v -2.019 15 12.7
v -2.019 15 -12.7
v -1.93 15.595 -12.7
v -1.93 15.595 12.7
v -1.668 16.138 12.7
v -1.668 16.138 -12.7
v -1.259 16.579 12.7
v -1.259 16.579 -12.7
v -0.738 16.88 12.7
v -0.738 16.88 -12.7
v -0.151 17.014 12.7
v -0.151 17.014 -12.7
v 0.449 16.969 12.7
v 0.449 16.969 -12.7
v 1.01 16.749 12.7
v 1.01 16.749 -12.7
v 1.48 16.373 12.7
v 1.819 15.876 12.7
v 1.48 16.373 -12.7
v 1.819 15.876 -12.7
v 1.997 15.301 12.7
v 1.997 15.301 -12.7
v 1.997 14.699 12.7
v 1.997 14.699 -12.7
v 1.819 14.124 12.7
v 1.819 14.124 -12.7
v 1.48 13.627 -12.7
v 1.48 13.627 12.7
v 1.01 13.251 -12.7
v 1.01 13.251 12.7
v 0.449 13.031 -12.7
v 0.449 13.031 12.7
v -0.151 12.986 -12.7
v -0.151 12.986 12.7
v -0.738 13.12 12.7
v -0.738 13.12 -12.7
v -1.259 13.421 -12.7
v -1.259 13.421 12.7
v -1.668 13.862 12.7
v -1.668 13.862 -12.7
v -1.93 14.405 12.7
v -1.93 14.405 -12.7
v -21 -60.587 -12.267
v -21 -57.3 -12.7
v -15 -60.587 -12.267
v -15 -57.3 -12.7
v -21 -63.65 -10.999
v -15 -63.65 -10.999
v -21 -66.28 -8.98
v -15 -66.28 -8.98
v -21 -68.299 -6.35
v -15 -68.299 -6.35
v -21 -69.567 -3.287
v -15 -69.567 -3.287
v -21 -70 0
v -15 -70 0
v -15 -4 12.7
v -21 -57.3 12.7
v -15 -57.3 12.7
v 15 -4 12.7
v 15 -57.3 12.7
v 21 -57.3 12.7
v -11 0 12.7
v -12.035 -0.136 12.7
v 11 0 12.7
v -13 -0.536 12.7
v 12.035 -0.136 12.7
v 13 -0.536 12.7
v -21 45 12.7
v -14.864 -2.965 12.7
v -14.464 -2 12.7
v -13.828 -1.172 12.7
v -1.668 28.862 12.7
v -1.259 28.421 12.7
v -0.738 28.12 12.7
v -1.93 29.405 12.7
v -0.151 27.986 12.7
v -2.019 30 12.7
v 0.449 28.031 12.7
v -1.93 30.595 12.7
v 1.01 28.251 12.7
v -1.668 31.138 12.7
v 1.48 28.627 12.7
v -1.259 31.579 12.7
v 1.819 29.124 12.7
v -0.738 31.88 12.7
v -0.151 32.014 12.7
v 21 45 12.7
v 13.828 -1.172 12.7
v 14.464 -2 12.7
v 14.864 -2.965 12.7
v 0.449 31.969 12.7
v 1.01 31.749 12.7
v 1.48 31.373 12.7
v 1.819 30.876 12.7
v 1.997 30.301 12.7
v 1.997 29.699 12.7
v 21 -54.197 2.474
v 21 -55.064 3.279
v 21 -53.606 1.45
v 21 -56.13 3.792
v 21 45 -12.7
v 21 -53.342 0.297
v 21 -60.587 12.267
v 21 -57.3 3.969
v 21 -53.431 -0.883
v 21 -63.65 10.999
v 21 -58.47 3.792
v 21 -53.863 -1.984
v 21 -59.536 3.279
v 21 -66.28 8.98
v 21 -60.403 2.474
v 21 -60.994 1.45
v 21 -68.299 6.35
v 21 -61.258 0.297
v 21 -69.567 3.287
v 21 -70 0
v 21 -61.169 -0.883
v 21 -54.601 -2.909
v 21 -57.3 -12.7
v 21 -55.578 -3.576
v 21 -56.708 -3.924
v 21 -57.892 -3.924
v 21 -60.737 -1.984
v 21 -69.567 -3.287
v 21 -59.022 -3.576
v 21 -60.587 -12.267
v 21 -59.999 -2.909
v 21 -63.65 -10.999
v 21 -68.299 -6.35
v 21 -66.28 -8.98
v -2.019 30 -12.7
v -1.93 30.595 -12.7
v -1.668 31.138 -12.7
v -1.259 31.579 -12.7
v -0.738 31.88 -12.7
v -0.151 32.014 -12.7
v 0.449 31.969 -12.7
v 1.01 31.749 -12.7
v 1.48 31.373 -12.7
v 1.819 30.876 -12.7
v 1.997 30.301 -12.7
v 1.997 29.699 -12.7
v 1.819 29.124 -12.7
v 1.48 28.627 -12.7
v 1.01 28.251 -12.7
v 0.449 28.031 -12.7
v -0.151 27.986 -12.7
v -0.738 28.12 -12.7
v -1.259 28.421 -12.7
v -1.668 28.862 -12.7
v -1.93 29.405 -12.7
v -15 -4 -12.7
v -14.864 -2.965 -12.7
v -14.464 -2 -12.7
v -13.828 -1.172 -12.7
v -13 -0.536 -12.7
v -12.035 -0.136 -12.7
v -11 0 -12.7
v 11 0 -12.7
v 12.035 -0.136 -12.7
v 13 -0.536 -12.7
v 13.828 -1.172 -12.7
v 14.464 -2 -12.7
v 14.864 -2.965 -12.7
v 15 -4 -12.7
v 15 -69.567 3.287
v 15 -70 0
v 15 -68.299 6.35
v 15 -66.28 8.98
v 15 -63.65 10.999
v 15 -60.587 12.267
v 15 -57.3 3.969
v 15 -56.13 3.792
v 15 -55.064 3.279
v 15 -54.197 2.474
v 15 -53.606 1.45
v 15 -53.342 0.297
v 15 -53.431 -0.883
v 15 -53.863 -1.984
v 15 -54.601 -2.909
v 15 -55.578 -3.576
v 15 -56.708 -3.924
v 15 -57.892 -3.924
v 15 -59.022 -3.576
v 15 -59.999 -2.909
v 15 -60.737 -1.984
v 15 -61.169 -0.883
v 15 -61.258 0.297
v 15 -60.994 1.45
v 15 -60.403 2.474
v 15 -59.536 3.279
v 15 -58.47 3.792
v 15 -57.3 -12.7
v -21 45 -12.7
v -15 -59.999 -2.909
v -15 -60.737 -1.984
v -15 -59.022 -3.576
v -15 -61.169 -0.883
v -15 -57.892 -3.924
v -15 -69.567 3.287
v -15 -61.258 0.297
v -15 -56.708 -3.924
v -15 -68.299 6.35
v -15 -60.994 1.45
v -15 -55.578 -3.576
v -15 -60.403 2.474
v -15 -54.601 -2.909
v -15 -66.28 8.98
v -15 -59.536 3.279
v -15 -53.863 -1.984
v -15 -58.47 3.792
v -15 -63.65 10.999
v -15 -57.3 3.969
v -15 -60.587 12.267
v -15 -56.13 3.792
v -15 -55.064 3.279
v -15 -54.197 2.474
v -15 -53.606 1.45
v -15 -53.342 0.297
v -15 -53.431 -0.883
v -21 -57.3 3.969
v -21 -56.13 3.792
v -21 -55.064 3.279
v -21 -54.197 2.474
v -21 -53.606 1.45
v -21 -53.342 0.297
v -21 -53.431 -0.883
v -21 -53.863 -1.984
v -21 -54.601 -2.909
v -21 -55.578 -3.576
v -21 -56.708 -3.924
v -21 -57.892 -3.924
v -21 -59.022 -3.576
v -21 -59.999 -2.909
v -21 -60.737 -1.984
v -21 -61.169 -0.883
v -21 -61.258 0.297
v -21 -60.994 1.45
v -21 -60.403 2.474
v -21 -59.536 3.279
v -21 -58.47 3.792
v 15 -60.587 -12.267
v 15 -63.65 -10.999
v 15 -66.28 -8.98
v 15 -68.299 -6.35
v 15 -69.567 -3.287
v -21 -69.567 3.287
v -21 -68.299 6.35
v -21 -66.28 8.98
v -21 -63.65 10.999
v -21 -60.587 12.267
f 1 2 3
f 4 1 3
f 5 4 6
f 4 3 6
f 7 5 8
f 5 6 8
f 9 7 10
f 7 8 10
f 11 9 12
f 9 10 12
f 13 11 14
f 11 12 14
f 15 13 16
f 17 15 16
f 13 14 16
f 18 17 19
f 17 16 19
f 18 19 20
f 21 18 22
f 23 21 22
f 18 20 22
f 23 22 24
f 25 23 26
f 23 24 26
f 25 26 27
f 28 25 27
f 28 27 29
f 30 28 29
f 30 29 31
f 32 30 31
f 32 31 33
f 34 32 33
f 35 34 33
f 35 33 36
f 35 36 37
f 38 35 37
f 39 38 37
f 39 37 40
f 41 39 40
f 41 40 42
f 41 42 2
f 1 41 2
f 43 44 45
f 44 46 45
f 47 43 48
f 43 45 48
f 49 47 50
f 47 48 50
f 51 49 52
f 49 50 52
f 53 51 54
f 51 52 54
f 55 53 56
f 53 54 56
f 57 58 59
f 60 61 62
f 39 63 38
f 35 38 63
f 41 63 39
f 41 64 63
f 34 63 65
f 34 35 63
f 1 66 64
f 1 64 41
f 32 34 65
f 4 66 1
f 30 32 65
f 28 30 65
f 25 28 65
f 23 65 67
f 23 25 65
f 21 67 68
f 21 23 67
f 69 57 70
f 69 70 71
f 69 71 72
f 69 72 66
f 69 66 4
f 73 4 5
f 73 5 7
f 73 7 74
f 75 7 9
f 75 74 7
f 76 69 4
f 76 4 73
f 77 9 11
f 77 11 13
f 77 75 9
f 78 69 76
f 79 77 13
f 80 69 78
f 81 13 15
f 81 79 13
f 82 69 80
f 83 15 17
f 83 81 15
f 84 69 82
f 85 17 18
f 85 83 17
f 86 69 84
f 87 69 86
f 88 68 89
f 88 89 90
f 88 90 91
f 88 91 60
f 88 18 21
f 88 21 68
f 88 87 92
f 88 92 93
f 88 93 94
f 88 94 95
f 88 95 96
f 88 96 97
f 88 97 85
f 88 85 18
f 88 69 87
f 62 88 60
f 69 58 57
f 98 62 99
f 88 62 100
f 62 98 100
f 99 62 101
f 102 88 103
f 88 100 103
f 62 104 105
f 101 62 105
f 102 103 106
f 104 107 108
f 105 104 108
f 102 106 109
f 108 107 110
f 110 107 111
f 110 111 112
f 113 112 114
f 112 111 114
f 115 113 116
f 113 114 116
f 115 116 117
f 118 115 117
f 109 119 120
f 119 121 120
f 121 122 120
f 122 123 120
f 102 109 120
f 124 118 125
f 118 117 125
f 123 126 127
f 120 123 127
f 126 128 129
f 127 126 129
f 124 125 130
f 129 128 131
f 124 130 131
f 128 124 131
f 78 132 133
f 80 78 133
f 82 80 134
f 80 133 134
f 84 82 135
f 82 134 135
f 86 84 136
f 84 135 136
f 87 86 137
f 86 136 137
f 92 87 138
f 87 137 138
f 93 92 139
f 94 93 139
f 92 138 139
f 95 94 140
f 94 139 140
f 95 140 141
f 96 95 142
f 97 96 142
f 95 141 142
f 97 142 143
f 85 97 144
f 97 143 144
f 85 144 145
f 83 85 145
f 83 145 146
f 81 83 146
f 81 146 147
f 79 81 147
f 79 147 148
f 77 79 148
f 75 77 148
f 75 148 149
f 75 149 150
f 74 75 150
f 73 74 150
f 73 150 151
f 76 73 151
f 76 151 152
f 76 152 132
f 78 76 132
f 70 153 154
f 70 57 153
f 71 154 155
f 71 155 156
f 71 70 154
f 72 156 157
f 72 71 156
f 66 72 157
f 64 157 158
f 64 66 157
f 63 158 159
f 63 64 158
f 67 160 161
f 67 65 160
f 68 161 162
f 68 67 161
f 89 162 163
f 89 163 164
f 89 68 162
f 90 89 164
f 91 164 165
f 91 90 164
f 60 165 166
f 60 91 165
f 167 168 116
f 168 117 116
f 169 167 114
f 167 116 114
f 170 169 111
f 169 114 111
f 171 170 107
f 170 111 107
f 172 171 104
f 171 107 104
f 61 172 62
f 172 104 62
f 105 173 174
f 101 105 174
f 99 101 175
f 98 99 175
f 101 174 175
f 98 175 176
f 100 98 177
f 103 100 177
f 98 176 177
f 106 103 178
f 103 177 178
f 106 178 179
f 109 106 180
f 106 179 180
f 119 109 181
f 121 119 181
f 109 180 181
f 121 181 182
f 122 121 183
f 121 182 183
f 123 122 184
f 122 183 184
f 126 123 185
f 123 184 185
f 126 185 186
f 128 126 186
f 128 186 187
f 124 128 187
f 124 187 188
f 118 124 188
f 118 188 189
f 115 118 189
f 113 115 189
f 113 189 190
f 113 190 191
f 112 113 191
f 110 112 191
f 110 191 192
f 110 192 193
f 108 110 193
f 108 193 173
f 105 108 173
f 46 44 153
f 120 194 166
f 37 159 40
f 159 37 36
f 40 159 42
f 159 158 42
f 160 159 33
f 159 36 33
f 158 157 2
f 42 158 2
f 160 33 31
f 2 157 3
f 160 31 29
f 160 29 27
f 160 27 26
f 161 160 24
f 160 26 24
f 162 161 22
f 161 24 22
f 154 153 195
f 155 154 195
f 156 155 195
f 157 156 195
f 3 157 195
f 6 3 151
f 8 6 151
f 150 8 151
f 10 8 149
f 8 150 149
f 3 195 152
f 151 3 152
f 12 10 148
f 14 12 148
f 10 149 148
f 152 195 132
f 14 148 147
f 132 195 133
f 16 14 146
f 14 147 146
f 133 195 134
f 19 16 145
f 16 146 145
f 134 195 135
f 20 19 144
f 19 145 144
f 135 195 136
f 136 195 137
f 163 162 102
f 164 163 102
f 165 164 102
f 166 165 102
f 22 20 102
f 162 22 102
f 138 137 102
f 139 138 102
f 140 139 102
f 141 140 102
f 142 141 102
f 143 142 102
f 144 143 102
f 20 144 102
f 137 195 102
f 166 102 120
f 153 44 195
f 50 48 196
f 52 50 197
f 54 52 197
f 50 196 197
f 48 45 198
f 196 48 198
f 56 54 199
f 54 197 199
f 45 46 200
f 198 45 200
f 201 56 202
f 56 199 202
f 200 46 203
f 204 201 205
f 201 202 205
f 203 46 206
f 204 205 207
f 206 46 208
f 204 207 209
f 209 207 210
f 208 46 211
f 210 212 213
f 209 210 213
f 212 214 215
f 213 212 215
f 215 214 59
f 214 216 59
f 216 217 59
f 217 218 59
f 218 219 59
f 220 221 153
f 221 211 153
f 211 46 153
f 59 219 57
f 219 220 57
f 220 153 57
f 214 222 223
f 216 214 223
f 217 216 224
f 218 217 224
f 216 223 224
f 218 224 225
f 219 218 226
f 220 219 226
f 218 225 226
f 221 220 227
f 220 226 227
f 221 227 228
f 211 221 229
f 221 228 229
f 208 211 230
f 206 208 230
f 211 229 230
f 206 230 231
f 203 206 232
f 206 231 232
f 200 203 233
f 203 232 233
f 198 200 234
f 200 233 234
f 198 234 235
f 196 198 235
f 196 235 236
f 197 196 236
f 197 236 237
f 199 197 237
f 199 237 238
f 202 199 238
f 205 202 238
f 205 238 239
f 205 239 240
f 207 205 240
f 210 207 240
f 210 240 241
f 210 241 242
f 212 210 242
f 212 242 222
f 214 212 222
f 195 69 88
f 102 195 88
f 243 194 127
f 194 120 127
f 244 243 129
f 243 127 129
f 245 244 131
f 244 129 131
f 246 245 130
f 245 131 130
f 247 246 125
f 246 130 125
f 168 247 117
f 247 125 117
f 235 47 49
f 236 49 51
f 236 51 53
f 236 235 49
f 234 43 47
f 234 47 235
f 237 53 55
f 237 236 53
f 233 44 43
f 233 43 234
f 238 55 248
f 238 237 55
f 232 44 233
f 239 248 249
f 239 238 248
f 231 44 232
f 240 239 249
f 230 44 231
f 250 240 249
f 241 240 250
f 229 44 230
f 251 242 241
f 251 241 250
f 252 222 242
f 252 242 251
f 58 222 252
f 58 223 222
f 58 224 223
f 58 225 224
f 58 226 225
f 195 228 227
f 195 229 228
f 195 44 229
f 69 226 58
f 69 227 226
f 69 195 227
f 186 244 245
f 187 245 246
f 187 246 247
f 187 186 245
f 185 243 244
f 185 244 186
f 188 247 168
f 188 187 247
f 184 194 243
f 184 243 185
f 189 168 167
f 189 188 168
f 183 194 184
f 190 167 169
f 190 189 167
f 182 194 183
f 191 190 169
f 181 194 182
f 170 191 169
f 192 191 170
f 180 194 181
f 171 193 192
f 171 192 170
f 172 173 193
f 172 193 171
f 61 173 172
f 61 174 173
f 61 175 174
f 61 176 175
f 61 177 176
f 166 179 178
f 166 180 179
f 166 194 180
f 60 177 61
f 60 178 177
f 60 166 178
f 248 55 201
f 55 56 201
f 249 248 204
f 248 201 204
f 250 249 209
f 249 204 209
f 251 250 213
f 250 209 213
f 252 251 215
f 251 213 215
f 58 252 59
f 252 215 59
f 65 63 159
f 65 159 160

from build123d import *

# Parameters (mm, degrees)
SKETCH_1_W            = 42
SKETCH_1_H            = 25.4
EXTRUDE_1_DEPTH       = 70
SKETCH_5_W            = 6
SKETCH_5_H            = 25.4
EXTRUDE_5_DEPTH       = 70
SKETCH_6_R            = 3.96875
CUT_EXTRUDE_2_DEPTH   = 83.61531335
FILLET_6_R            = 4
HOLE_WIZARD_10_32_1_D = 4.0386
FILLET_7_R            = 12.7
SKETCH_9_W            = 42
SKETCH_9_H            = 25
CUT_EXTRUDE_3_DEPTH   = 78.370278531


with BuildPart() as part:
    # 草圖1 → 填料-伸長1 (new body)
    with BuildSketch(Plane(origin=(0, 0, 0), x_dir=(1, 0, 0), z_dir=(0, 1, 0))):
        Rectangle(SKETCH_1_W, SKETCH_1_H)
    extrude(amount=EXTRUDE_1_DEPTH)

    # 草圖5 → 填料-伸長5 (add)
    with BuildSketch(Plane.XZ):
        with Locations((-18, 0)):
            Rectangle(SKETCH_5_W, SKETCH_5_H)
        with Locations((18, 0)):
            Rectangle(SKETCH_5_W, SKETCH_5_H)
    extrude(amount=EXTRUDE_5_DEPTH)

    # 草圖6 → 除料-伸長2 (cut, through all)
    with BuildSketch(Plane.ZY.offset(21)):
        with Locations((0, -57.3)):
            Circle(SKETCH_6_R)
    extrude(amount=-CUT_EXTRUDE_2_DEPTH, mode=Mode.SUBTRACT)

    # 圓角6
    fillet_6_edges = [part.edges().sort_by_distance(p)[0] for p in [
        (15, 0, 0),
        (-15, 0, 0),
    ]]
    fillet(fillet_6_edges, radius=FILLET_6_R)

    # #10-32 螺紋孔1 (through all)
    with Locations(Plane.XY.offset(12.7)):
        with Locations((0, 30), (0, 15)):
            Hole(HOLE_WIZARD_10_32_1_D / 2)

    # 圓角7
    fillet_7_edges = [part.edges().sort_by_distance(p)[0] for p in [
        (18, -70, 12.7),
        (18, -70, -12.7),
        (-18, -70, 12.7),
        (-18, -70, -12.7),
    ]]
    fillet(fillet_7_edges, radius=FILLET_7_R - 0.0001)  # a hair under: the kernel refuses the full size

    # 草圖9 → 除料-伸長3 (cut, through all)
    with BuildSketch(Plane.XY.offset(12.7)):
        with Locations((0, 57.5)):
            Rectangle(SKETCH_9_W, SKETCH_9_H)
    extrude(amount=-CUT_EXTRUDE_3_DEPTH, mode=Mode.SUBTRACT)


solid = part.part
